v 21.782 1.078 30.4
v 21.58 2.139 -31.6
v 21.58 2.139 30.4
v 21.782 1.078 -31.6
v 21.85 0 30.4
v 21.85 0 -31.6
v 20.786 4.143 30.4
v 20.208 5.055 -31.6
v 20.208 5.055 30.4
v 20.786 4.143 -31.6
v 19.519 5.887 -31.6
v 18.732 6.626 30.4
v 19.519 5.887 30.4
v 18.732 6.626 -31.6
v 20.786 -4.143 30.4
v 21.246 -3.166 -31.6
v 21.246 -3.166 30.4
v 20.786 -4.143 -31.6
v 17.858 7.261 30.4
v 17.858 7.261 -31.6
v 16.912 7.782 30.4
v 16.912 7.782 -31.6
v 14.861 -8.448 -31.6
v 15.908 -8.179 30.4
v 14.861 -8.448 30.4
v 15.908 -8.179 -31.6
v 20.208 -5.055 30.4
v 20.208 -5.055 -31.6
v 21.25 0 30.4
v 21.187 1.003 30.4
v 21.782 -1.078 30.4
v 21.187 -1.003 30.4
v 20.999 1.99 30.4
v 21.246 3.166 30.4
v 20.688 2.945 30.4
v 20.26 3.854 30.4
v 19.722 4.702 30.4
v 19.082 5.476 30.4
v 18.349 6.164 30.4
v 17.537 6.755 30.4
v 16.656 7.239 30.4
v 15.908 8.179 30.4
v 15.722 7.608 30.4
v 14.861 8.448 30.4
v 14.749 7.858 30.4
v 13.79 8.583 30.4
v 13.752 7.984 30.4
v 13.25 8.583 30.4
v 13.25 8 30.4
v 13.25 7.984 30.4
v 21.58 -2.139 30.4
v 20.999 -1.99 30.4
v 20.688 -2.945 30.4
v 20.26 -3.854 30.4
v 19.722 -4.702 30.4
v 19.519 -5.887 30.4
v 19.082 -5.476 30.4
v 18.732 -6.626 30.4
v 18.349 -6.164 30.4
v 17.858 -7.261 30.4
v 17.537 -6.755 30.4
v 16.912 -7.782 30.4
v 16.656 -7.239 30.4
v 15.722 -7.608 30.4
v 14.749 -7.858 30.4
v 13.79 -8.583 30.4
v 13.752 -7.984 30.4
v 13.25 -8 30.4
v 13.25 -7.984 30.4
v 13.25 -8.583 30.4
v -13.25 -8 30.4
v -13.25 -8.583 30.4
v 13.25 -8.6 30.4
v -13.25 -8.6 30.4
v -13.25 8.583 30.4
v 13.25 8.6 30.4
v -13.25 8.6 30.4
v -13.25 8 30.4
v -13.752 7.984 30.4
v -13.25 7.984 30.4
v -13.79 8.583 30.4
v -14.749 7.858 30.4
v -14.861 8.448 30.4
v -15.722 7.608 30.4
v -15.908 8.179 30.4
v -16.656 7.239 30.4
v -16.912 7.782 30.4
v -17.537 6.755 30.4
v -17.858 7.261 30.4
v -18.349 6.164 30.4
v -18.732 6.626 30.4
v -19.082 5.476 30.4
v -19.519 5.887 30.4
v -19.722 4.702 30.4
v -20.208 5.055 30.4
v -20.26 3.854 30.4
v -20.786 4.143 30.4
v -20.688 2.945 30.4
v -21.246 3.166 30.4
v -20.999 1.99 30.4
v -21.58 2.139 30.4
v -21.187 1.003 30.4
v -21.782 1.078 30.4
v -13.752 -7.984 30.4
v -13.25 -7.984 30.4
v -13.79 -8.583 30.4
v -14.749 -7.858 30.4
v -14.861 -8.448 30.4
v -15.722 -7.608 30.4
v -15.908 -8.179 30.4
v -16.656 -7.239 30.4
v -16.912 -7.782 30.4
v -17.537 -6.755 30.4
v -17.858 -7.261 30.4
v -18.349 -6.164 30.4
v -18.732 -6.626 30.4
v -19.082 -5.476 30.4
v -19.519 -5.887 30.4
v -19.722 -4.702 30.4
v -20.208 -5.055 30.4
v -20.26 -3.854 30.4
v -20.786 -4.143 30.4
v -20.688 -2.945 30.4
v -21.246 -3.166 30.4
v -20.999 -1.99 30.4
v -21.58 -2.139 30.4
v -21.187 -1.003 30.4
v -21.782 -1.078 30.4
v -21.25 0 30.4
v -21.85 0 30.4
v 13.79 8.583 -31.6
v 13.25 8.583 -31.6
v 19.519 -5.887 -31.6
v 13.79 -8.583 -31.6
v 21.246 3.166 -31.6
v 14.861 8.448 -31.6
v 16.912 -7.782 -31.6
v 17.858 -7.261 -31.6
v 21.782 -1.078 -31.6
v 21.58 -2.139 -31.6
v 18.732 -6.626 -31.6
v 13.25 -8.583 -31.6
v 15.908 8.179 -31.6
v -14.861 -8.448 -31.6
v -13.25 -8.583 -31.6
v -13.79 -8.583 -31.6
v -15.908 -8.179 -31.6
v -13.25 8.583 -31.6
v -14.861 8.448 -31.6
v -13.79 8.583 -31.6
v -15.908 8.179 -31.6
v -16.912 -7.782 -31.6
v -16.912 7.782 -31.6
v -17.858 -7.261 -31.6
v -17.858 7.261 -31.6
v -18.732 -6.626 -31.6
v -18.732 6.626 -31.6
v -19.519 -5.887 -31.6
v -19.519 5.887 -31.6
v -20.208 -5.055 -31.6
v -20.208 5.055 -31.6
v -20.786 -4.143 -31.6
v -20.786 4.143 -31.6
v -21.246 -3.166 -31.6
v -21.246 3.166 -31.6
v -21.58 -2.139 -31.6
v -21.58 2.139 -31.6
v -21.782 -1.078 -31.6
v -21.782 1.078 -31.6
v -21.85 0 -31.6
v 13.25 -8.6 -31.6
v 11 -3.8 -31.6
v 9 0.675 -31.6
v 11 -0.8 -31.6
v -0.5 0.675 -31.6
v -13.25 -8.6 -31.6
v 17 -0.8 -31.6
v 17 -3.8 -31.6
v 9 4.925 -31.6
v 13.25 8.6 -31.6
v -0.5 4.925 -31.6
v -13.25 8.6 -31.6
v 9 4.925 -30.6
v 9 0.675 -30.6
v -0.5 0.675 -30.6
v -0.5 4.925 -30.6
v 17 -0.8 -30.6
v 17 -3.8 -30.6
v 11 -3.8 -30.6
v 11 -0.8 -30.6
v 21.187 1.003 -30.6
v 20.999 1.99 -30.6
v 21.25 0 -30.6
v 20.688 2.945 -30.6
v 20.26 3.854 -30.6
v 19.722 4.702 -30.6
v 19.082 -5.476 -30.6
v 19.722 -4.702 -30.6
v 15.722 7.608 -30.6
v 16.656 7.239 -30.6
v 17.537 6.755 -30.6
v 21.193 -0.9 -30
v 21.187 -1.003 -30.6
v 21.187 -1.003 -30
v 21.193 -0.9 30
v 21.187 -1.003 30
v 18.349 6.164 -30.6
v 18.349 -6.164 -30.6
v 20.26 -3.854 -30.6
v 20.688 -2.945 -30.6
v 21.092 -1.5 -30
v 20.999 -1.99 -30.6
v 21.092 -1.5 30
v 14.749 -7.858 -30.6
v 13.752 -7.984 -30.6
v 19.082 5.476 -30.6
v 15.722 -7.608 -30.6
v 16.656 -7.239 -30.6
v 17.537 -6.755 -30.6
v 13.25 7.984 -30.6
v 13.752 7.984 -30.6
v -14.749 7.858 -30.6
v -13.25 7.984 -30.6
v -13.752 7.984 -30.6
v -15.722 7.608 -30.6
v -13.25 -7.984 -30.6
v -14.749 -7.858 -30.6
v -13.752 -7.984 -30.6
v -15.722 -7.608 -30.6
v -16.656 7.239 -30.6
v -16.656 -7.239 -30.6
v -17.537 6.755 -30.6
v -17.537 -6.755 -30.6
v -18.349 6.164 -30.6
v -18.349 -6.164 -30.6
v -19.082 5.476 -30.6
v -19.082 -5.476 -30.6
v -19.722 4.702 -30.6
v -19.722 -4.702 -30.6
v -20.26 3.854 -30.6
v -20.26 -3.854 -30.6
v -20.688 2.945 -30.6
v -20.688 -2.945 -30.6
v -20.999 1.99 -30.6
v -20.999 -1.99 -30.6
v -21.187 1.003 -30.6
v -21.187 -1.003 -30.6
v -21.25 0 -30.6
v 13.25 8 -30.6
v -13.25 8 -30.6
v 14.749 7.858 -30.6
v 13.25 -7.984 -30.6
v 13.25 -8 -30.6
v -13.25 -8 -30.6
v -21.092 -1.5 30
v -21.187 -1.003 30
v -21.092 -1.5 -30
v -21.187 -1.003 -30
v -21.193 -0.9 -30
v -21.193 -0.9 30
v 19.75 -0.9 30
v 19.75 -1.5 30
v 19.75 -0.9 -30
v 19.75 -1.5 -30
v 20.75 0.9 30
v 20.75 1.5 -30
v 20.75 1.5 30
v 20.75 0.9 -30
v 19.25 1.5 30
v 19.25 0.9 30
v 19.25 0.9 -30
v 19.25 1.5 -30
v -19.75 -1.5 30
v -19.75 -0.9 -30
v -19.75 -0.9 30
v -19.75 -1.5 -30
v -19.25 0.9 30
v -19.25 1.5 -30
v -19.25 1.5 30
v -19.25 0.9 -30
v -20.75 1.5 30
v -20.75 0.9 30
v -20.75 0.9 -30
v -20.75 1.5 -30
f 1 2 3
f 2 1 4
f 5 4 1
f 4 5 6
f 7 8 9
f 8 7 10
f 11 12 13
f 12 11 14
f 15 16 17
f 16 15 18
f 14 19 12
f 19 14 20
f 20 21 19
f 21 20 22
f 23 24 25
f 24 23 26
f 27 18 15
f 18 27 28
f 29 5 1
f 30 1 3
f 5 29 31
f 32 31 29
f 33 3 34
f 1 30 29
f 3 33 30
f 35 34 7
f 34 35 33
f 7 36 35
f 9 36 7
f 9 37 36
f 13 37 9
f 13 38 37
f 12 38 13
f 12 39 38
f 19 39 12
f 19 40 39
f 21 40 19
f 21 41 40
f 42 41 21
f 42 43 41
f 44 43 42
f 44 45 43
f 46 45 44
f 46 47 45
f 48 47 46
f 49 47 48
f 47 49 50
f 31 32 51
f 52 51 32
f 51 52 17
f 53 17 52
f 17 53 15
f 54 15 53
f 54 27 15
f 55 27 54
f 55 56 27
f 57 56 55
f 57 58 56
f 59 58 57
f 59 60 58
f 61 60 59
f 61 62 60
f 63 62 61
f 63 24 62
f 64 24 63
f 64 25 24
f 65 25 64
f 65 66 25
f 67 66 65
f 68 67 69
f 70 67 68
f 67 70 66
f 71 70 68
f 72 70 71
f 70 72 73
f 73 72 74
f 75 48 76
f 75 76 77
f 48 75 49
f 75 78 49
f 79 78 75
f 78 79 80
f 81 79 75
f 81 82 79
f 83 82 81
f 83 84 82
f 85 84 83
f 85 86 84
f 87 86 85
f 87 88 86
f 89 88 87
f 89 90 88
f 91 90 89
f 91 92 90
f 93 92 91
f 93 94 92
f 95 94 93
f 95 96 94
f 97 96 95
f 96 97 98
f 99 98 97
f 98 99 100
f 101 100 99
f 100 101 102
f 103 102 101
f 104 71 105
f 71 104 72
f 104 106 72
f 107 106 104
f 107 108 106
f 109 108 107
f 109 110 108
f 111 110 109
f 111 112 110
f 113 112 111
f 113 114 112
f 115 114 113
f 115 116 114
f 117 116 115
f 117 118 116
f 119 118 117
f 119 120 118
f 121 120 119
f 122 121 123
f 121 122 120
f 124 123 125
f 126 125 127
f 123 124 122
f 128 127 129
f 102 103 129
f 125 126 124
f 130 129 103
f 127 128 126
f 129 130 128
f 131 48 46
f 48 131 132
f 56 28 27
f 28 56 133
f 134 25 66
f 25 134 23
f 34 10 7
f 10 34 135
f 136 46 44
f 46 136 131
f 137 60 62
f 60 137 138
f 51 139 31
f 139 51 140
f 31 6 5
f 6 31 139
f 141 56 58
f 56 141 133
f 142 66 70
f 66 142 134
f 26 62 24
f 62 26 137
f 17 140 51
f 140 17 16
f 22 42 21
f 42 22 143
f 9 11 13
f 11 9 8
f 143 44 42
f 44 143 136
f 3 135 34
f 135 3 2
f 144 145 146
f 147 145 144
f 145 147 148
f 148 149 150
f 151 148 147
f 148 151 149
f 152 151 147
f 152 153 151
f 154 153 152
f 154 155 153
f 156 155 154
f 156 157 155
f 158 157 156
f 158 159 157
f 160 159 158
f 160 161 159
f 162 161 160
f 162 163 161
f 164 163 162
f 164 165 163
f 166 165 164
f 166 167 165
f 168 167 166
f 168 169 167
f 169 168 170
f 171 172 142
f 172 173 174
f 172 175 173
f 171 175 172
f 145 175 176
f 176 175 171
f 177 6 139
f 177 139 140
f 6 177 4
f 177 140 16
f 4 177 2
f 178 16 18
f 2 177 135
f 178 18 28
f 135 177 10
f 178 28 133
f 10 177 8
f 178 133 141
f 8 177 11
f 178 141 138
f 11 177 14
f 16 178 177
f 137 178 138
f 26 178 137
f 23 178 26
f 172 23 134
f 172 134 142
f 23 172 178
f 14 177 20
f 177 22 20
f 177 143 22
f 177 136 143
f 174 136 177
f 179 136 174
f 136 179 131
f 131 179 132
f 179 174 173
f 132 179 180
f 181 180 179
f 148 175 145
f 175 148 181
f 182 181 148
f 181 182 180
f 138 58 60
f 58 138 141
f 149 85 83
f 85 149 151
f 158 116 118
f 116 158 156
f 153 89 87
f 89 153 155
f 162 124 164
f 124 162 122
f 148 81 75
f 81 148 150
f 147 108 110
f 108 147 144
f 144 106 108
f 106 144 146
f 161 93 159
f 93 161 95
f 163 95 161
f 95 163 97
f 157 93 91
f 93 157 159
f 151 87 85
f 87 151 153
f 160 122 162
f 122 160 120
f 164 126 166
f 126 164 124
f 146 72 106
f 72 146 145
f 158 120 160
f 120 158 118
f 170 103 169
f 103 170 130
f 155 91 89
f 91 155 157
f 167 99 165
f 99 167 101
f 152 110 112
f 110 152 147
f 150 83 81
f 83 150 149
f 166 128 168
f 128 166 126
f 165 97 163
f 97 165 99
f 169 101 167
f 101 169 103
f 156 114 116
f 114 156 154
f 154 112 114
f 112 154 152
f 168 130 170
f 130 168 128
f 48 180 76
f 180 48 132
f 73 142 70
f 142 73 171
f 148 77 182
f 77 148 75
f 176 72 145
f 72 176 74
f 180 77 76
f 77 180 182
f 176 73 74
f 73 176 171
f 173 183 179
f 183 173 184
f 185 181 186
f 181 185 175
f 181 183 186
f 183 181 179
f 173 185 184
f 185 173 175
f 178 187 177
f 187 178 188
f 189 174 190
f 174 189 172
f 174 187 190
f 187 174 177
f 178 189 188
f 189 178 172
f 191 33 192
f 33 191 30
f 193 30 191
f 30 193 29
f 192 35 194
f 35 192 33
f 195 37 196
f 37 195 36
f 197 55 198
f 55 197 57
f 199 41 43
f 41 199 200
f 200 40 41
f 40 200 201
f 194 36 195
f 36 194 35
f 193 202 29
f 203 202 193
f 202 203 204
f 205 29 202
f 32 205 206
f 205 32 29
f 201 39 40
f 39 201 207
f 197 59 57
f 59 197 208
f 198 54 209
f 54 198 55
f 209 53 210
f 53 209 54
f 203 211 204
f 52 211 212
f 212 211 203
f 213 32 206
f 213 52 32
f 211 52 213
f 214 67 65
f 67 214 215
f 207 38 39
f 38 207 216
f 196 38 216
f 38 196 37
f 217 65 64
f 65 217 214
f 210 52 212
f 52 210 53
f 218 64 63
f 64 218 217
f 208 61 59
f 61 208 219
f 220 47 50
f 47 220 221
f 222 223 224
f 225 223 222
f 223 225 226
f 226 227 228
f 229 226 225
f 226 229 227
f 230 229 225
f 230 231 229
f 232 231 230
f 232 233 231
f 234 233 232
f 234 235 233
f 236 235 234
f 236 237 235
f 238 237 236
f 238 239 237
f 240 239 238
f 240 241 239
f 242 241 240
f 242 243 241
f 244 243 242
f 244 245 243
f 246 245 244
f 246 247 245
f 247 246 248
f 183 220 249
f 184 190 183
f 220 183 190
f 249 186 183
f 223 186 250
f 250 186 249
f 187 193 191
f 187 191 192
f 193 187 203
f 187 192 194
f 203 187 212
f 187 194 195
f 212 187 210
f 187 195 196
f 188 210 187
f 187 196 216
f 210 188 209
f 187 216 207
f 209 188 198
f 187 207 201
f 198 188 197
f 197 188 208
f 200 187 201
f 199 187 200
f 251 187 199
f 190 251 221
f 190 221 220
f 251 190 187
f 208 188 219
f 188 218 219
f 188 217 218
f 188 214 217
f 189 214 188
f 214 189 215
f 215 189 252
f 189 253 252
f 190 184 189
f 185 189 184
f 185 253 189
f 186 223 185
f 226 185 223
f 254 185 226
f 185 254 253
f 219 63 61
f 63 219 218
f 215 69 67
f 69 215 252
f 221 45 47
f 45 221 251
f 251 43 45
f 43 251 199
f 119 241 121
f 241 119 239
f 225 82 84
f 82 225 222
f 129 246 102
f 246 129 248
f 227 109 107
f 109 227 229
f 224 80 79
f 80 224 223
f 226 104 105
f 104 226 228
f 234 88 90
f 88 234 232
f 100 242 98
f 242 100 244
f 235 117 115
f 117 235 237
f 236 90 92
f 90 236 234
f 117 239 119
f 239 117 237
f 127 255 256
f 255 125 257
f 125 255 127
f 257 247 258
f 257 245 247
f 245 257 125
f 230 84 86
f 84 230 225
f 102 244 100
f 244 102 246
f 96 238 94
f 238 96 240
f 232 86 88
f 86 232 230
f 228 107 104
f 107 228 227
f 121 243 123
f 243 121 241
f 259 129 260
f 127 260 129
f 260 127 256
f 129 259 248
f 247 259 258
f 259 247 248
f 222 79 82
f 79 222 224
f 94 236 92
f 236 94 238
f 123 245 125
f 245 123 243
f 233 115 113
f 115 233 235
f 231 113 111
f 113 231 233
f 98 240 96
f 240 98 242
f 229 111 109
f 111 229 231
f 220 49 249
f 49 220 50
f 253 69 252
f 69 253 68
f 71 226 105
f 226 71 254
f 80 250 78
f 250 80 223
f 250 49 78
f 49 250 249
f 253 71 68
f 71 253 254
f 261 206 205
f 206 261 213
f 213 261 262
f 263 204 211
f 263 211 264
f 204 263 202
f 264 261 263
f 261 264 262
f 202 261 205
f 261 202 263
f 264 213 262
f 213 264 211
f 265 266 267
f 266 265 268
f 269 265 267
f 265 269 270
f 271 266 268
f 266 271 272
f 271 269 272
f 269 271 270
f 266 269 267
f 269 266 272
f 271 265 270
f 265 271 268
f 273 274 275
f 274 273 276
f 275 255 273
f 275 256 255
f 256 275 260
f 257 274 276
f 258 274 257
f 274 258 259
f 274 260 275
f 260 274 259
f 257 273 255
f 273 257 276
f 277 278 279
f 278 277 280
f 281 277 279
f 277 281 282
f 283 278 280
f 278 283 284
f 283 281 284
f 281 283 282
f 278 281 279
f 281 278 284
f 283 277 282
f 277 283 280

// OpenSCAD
// Simple Box for Espruino
// Taller to allow room for LiPo phone battery to be slotted in
// Open at one end so Espruino slides in
// Can be 3D printed on end

$fn = 50;
INNER_RAD = 8.0;
INNER_LENGTH = 60;
INNER_WIDTH = 42.5;
THICKNESS = 0.6;
END_THICKNESS = 1;
OUTER_RAD = INNER_RAD + THICKNESS;
OUTER_LENGTH = INNER_LENGTH + END_THICKNESS*2;
OUTER_WIDTH = INNER_WIDTH + THICKNESS*2;
GRIP_SIZE = 1.5;
GRIP_OFFSET = 0;

module shape(w,r,l) {
 union() {
  translate([(w/2)-r,0,0]) cylinder(r=r,h=l,center=true);
  translate([r-(w/2),0,0]) cylinder(r=r,h=l,center=true);
  cube([w-r*2,r*2,l], center=true);
 }
}

module board_grip(w,tweak) {
 spacing = THICKNESS + 1.2;
 l = INNER_LENGTH;
 h = THICKNESS; 
 translate([0,-(spacing/2+h/2),0]) cube([w,h,l], center=true);
 translate([tweak,h/2+spacing/2,0]) cube([w,h,l], center=true);
}

module back_cutouts() {
 d = END_THICKNESS+0.2;
 o = -(END_THICKNESS + 0.1);
 translate([4.25,0.8+2,o]) cube([9.5,4.25,d], center=true); // USB
 translate([41/2 - 6.5,-(0.8+1.5),o]) cube([6,3,d], center=true); // Power
}

module side_cutouts() {
 r=2;
 h=THICKNESS+4;
 // buttons
 // ------------------------------------ UNCOMMENT THE NEXT 2 LINES FOR BUTTON HOLES
 // translate([13,0,26.5]) rotate(a=[90,0,0]) cylinder(r=r,h=h,center=true);
 // translate([13,0,38.5]) rotate(a=[90,0,0]) cylinder(r=r,h=h,center=true);
 // ------------------------------------
}

union() {
 difference() {
  translate([0,0,-THICKNESS]) shape(OUTER_WIDTH, OUTER_RAD, OUTER_LENGTH);
  union() {
   translate([0,GRIP_OFFSET,-INNER_LENGTH/2]) back_cutouts();
   shape(INNER_WIDTH, INNER_RAD, INNER_LENGTH+THICKNESS*2);
   translate([0,-(INNER_RAD+OUTER_RAD)/2,-INNER_LENGTH/2]) side_cutouts();
  }
 }
 translate([(INNER_WIDTH-GRIP_SIZE)/2,GRIP_OFFSET,0]) board_grip(GRIP_SIZE,-0.5);
 translate([(GRIP_SIZE-INNER_WIDTH)/2,GRIP_OFFSET,0]) board_grip(GRIP_SIZE,0.5);
}
